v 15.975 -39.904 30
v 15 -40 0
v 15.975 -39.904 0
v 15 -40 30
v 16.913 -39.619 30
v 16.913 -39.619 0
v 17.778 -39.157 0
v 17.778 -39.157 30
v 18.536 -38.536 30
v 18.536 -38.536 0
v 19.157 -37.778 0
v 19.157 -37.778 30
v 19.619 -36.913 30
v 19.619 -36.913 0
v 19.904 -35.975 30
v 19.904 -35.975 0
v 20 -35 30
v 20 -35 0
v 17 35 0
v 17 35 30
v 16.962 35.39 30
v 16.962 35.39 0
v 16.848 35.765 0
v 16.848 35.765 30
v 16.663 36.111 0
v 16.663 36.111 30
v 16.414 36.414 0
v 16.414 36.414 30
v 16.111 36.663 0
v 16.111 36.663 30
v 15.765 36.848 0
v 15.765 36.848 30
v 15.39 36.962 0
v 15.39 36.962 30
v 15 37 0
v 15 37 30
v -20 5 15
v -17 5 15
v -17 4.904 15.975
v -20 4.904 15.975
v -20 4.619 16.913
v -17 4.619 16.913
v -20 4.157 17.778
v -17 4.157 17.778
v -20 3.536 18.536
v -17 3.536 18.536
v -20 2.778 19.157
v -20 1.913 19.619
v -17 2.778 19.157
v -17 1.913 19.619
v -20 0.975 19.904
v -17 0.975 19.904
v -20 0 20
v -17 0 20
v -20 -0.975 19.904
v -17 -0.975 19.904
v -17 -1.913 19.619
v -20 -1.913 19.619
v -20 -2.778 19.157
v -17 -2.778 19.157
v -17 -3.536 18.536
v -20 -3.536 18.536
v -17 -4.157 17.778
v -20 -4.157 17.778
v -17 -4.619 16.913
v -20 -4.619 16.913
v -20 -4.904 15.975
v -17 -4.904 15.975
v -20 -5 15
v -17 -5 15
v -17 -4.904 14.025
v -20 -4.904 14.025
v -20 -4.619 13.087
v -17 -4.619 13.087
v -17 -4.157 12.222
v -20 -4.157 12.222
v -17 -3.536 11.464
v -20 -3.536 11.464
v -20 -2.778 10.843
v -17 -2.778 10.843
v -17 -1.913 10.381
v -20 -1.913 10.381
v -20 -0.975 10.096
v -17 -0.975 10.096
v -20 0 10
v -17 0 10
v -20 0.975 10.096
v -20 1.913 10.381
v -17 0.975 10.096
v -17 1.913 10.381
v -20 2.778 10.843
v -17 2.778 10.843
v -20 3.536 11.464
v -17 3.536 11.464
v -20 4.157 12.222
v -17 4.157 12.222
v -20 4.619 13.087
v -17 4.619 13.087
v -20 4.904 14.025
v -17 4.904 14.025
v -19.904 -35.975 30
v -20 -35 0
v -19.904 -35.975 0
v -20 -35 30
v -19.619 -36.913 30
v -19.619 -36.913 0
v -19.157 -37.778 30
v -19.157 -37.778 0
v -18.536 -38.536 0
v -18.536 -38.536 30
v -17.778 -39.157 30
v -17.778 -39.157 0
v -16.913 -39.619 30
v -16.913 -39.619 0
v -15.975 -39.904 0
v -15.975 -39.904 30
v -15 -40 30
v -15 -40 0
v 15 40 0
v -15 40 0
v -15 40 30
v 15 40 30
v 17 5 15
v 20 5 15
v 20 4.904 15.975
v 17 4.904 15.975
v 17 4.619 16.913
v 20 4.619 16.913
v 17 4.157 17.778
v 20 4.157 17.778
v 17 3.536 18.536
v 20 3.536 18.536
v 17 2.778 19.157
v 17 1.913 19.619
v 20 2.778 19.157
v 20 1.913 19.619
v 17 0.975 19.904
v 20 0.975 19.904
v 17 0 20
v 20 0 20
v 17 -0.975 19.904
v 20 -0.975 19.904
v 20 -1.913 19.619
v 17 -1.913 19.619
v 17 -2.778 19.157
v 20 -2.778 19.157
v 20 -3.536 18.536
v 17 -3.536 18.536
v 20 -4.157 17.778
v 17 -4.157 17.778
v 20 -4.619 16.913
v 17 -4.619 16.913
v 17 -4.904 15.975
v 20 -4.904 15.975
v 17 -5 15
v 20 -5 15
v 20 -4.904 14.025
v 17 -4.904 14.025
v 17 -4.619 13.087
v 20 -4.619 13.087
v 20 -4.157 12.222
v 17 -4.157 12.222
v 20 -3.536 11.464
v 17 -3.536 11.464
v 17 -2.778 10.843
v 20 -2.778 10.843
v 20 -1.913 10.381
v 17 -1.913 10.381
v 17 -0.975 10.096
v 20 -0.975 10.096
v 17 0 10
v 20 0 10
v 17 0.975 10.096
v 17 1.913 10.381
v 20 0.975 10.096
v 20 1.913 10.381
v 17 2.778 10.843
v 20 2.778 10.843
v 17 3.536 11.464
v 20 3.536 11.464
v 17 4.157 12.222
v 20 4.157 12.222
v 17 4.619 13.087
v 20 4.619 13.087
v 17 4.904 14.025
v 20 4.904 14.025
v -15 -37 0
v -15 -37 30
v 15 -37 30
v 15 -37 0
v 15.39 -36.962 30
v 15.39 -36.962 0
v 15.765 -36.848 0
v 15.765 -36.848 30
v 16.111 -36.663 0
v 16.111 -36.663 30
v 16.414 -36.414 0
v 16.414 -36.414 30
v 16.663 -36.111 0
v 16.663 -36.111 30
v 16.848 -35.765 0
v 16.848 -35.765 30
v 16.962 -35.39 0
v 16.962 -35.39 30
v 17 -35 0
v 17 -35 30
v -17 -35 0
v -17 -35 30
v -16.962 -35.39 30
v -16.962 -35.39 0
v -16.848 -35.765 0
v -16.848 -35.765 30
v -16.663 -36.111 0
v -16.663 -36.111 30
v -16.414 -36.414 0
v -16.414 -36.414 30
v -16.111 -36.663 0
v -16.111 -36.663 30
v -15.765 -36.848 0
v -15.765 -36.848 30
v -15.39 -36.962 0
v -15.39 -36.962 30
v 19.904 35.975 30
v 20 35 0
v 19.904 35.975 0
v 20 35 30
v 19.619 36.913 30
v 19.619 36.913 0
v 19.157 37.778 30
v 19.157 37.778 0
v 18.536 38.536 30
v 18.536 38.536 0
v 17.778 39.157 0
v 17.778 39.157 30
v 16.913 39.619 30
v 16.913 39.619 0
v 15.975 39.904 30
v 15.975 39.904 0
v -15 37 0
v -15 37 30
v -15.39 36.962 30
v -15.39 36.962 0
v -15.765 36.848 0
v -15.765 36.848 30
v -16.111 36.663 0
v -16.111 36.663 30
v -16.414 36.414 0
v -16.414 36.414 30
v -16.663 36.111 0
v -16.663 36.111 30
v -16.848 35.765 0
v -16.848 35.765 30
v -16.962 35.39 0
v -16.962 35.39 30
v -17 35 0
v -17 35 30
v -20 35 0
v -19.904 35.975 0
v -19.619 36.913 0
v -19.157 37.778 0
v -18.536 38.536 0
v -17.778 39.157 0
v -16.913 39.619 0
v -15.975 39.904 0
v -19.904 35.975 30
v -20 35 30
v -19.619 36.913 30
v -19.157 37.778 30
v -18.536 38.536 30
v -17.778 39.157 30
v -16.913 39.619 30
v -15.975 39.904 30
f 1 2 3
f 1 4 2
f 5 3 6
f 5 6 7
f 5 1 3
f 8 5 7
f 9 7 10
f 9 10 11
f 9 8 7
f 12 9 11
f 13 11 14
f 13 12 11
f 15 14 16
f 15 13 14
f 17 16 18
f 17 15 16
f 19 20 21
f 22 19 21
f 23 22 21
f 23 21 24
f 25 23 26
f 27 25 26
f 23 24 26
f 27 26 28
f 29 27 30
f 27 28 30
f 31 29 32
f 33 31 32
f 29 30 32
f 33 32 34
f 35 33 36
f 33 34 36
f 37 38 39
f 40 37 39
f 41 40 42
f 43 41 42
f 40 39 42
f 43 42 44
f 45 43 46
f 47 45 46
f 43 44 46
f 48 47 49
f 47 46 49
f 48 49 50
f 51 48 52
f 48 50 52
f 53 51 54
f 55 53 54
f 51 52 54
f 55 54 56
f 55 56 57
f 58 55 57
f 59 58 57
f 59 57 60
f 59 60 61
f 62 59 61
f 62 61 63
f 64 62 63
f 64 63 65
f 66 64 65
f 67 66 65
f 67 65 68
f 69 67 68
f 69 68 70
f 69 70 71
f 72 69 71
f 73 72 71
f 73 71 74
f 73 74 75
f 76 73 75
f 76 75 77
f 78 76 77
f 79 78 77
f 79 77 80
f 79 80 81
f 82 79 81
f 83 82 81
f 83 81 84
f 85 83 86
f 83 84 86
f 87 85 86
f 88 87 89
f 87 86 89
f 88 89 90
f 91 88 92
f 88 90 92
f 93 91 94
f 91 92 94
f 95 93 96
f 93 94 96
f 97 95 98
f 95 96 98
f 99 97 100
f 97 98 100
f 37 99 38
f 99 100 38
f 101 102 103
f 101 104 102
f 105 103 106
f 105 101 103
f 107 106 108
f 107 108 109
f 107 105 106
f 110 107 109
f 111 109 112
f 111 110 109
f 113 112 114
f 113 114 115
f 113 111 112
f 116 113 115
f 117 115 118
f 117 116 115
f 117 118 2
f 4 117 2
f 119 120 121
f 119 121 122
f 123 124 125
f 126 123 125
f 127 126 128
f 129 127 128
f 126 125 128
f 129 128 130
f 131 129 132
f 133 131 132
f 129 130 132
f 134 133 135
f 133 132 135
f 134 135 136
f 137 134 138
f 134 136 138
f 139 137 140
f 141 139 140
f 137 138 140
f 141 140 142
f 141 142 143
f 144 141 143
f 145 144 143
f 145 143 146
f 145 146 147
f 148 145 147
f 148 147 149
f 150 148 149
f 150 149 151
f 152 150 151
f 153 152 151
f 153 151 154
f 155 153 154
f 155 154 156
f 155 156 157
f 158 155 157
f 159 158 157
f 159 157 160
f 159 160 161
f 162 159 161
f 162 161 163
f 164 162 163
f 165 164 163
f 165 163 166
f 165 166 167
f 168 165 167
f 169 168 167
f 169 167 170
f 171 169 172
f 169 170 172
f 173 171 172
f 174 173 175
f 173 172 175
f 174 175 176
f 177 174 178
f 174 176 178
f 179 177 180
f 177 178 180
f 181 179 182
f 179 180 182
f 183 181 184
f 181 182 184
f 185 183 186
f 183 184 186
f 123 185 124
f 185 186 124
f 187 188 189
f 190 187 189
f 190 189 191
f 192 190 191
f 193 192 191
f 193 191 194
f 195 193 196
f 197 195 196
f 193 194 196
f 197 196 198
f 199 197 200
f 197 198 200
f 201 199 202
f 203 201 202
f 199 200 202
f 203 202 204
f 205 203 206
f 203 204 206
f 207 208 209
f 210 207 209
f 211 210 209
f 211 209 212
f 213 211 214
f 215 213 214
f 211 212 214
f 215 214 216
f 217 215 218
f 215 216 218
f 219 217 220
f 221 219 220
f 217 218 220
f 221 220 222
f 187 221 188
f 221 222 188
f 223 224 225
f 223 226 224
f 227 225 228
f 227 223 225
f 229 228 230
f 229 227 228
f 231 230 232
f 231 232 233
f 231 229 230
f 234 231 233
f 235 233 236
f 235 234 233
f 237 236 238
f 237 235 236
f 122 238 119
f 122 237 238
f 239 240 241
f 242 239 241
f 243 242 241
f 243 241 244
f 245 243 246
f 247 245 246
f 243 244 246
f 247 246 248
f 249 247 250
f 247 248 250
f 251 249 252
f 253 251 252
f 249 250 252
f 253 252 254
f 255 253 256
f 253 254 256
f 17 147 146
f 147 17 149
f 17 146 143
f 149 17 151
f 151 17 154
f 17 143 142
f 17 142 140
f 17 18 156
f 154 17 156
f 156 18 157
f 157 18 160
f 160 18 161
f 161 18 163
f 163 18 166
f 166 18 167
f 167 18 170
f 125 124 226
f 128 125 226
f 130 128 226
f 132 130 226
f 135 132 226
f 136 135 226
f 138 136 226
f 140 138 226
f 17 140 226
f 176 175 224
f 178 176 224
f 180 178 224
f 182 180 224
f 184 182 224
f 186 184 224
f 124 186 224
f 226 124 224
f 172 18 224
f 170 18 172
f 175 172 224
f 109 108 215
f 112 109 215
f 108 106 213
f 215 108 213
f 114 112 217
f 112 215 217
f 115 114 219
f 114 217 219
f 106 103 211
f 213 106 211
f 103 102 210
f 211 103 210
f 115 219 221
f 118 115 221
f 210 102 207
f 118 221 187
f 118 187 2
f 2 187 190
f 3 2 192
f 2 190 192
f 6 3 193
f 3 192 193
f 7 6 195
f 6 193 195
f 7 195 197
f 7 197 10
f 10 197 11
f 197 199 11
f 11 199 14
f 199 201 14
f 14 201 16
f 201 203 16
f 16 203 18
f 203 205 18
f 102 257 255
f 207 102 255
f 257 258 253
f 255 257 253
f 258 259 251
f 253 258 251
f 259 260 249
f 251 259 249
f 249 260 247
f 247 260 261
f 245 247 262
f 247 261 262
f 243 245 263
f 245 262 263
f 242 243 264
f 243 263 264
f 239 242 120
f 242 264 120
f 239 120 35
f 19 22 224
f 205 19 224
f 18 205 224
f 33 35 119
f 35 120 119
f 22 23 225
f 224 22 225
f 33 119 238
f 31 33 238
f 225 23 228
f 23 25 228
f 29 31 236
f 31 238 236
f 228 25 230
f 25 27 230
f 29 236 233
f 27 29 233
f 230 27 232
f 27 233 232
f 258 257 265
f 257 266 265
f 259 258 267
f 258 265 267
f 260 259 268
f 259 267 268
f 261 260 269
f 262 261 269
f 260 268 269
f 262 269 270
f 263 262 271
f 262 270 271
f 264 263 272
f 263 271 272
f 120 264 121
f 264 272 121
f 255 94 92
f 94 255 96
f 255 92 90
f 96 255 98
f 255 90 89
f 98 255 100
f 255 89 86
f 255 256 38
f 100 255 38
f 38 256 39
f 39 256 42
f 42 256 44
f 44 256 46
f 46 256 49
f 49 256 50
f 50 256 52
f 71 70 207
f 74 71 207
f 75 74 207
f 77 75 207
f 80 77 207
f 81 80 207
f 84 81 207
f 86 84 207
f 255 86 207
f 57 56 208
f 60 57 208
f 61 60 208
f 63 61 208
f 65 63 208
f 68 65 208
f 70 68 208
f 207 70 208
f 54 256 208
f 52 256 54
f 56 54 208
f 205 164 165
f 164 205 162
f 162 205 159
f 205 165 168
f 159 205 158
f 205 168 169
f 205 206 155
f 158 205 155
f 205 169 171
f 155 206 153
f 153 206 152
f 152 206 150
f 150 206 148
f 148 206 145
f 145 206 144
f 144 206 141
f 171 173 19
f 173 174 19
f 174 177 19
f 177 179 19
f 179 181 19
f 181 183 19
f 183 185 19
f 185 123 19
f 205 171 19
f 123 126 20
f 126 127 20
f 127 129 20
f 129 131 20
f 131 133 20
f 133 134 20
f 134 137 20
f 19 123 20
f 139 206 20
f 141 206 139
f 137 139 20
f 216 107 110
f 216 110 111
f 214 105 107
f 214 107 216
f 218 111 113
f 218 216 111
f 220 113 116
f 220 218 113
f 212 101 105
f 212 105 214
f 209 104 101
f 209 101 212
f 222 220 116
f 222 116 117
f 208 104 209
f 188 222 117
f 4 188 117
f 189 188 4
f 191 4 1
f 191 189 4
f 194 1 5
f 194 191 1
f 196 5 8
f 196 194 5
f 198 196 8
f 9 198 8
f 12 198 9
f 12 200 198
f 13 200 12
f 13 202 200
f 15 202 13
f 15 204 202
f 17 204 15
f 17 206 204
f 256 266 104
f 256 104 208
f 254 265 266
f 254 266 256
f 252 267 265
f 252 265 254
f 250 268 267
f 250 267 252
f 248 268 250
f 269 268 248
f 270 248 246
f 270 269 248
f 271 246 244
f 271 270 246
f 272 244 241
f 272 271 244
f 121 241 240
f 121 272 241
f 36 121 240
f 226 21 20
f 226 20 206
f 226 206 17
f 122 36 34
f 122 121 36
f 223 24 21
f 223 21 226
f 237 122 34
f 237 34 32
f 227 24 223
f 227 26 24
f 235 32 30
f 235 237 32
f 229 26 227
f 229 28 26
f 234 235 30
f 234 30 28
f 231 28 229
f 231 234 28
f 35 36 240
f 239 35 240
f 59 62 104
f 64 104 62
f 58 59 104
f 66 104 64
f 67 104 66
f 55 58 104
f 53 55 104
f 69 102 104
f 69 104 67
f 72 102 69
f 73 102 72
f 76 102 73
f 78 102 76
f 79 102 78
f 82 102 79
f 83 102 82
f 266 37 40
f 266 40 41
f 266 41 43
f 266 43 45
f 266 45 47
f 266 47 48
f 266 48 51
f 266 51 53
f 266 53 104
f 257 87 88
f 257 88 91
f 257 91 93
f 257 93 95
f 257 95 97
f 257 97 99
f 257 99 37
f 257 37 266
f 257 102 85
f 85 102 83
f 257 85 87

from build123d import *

# Parameters (mm, degrees)
F0_W     = 40
F0_H     = 80
F1_DEPTH = 30
F2_R     = 5
F4_DEPTH = 30
F5_R     = 5
F6_DEPTH = 40.001


with BuildPart() as f1:
    # F0 (on Top) → F1 (new body)
    with BuildSketch(Plane.XY):
        Rectangle(F0_W, F0_H)
    extrude(amount=F1_DEPTH)

    # F2
    f2_edges = [f1.edges().sort_by_distance(p)[0] for p in [
        (20, 40, 15),
        (-20, 40, 15),
        (-20, -40, 15),
        (20, -40, 15),
    ]]
    fillet(f2_edges, radius=F2_R)

    # F3 (on face) → F4 (cut)
    with BuildSketch(Plane.XY.offset(30)):
        with BuildLine():
            ThreePointArc((17, 35), (16.414214, 36.414214), (15, 37))
            Line((15, 37), (-15, 37))
            ThreePointArc((-15, 37), (-16.414214, 36.414214), (-17, 35))
            Line((-17, 35), (-17, -35))
            ThreePointArc((-17, -35), (-16.414214, -36.414214), (-15, -37))
            Line((-15, -37), (15, -37))
            ThreePointArc((15, -37), (16.414214, -36.414214), (17, -35))
            Line((17, -35), (17, 35))
        make_face()
    extrude(amount=-F4_DEPTH, mode=Mode.SUBTRACT)

    # F5 (on face) → F6 (cut, through all)
    with BuildSketch(Plane.YZ.offset(20)):
        with Locations((0, 15)):
            Circle(F5_R)
    extrude(amount=-F6_DEPTH, mode=Mode.SUBTRACT)


solid = f1.part
